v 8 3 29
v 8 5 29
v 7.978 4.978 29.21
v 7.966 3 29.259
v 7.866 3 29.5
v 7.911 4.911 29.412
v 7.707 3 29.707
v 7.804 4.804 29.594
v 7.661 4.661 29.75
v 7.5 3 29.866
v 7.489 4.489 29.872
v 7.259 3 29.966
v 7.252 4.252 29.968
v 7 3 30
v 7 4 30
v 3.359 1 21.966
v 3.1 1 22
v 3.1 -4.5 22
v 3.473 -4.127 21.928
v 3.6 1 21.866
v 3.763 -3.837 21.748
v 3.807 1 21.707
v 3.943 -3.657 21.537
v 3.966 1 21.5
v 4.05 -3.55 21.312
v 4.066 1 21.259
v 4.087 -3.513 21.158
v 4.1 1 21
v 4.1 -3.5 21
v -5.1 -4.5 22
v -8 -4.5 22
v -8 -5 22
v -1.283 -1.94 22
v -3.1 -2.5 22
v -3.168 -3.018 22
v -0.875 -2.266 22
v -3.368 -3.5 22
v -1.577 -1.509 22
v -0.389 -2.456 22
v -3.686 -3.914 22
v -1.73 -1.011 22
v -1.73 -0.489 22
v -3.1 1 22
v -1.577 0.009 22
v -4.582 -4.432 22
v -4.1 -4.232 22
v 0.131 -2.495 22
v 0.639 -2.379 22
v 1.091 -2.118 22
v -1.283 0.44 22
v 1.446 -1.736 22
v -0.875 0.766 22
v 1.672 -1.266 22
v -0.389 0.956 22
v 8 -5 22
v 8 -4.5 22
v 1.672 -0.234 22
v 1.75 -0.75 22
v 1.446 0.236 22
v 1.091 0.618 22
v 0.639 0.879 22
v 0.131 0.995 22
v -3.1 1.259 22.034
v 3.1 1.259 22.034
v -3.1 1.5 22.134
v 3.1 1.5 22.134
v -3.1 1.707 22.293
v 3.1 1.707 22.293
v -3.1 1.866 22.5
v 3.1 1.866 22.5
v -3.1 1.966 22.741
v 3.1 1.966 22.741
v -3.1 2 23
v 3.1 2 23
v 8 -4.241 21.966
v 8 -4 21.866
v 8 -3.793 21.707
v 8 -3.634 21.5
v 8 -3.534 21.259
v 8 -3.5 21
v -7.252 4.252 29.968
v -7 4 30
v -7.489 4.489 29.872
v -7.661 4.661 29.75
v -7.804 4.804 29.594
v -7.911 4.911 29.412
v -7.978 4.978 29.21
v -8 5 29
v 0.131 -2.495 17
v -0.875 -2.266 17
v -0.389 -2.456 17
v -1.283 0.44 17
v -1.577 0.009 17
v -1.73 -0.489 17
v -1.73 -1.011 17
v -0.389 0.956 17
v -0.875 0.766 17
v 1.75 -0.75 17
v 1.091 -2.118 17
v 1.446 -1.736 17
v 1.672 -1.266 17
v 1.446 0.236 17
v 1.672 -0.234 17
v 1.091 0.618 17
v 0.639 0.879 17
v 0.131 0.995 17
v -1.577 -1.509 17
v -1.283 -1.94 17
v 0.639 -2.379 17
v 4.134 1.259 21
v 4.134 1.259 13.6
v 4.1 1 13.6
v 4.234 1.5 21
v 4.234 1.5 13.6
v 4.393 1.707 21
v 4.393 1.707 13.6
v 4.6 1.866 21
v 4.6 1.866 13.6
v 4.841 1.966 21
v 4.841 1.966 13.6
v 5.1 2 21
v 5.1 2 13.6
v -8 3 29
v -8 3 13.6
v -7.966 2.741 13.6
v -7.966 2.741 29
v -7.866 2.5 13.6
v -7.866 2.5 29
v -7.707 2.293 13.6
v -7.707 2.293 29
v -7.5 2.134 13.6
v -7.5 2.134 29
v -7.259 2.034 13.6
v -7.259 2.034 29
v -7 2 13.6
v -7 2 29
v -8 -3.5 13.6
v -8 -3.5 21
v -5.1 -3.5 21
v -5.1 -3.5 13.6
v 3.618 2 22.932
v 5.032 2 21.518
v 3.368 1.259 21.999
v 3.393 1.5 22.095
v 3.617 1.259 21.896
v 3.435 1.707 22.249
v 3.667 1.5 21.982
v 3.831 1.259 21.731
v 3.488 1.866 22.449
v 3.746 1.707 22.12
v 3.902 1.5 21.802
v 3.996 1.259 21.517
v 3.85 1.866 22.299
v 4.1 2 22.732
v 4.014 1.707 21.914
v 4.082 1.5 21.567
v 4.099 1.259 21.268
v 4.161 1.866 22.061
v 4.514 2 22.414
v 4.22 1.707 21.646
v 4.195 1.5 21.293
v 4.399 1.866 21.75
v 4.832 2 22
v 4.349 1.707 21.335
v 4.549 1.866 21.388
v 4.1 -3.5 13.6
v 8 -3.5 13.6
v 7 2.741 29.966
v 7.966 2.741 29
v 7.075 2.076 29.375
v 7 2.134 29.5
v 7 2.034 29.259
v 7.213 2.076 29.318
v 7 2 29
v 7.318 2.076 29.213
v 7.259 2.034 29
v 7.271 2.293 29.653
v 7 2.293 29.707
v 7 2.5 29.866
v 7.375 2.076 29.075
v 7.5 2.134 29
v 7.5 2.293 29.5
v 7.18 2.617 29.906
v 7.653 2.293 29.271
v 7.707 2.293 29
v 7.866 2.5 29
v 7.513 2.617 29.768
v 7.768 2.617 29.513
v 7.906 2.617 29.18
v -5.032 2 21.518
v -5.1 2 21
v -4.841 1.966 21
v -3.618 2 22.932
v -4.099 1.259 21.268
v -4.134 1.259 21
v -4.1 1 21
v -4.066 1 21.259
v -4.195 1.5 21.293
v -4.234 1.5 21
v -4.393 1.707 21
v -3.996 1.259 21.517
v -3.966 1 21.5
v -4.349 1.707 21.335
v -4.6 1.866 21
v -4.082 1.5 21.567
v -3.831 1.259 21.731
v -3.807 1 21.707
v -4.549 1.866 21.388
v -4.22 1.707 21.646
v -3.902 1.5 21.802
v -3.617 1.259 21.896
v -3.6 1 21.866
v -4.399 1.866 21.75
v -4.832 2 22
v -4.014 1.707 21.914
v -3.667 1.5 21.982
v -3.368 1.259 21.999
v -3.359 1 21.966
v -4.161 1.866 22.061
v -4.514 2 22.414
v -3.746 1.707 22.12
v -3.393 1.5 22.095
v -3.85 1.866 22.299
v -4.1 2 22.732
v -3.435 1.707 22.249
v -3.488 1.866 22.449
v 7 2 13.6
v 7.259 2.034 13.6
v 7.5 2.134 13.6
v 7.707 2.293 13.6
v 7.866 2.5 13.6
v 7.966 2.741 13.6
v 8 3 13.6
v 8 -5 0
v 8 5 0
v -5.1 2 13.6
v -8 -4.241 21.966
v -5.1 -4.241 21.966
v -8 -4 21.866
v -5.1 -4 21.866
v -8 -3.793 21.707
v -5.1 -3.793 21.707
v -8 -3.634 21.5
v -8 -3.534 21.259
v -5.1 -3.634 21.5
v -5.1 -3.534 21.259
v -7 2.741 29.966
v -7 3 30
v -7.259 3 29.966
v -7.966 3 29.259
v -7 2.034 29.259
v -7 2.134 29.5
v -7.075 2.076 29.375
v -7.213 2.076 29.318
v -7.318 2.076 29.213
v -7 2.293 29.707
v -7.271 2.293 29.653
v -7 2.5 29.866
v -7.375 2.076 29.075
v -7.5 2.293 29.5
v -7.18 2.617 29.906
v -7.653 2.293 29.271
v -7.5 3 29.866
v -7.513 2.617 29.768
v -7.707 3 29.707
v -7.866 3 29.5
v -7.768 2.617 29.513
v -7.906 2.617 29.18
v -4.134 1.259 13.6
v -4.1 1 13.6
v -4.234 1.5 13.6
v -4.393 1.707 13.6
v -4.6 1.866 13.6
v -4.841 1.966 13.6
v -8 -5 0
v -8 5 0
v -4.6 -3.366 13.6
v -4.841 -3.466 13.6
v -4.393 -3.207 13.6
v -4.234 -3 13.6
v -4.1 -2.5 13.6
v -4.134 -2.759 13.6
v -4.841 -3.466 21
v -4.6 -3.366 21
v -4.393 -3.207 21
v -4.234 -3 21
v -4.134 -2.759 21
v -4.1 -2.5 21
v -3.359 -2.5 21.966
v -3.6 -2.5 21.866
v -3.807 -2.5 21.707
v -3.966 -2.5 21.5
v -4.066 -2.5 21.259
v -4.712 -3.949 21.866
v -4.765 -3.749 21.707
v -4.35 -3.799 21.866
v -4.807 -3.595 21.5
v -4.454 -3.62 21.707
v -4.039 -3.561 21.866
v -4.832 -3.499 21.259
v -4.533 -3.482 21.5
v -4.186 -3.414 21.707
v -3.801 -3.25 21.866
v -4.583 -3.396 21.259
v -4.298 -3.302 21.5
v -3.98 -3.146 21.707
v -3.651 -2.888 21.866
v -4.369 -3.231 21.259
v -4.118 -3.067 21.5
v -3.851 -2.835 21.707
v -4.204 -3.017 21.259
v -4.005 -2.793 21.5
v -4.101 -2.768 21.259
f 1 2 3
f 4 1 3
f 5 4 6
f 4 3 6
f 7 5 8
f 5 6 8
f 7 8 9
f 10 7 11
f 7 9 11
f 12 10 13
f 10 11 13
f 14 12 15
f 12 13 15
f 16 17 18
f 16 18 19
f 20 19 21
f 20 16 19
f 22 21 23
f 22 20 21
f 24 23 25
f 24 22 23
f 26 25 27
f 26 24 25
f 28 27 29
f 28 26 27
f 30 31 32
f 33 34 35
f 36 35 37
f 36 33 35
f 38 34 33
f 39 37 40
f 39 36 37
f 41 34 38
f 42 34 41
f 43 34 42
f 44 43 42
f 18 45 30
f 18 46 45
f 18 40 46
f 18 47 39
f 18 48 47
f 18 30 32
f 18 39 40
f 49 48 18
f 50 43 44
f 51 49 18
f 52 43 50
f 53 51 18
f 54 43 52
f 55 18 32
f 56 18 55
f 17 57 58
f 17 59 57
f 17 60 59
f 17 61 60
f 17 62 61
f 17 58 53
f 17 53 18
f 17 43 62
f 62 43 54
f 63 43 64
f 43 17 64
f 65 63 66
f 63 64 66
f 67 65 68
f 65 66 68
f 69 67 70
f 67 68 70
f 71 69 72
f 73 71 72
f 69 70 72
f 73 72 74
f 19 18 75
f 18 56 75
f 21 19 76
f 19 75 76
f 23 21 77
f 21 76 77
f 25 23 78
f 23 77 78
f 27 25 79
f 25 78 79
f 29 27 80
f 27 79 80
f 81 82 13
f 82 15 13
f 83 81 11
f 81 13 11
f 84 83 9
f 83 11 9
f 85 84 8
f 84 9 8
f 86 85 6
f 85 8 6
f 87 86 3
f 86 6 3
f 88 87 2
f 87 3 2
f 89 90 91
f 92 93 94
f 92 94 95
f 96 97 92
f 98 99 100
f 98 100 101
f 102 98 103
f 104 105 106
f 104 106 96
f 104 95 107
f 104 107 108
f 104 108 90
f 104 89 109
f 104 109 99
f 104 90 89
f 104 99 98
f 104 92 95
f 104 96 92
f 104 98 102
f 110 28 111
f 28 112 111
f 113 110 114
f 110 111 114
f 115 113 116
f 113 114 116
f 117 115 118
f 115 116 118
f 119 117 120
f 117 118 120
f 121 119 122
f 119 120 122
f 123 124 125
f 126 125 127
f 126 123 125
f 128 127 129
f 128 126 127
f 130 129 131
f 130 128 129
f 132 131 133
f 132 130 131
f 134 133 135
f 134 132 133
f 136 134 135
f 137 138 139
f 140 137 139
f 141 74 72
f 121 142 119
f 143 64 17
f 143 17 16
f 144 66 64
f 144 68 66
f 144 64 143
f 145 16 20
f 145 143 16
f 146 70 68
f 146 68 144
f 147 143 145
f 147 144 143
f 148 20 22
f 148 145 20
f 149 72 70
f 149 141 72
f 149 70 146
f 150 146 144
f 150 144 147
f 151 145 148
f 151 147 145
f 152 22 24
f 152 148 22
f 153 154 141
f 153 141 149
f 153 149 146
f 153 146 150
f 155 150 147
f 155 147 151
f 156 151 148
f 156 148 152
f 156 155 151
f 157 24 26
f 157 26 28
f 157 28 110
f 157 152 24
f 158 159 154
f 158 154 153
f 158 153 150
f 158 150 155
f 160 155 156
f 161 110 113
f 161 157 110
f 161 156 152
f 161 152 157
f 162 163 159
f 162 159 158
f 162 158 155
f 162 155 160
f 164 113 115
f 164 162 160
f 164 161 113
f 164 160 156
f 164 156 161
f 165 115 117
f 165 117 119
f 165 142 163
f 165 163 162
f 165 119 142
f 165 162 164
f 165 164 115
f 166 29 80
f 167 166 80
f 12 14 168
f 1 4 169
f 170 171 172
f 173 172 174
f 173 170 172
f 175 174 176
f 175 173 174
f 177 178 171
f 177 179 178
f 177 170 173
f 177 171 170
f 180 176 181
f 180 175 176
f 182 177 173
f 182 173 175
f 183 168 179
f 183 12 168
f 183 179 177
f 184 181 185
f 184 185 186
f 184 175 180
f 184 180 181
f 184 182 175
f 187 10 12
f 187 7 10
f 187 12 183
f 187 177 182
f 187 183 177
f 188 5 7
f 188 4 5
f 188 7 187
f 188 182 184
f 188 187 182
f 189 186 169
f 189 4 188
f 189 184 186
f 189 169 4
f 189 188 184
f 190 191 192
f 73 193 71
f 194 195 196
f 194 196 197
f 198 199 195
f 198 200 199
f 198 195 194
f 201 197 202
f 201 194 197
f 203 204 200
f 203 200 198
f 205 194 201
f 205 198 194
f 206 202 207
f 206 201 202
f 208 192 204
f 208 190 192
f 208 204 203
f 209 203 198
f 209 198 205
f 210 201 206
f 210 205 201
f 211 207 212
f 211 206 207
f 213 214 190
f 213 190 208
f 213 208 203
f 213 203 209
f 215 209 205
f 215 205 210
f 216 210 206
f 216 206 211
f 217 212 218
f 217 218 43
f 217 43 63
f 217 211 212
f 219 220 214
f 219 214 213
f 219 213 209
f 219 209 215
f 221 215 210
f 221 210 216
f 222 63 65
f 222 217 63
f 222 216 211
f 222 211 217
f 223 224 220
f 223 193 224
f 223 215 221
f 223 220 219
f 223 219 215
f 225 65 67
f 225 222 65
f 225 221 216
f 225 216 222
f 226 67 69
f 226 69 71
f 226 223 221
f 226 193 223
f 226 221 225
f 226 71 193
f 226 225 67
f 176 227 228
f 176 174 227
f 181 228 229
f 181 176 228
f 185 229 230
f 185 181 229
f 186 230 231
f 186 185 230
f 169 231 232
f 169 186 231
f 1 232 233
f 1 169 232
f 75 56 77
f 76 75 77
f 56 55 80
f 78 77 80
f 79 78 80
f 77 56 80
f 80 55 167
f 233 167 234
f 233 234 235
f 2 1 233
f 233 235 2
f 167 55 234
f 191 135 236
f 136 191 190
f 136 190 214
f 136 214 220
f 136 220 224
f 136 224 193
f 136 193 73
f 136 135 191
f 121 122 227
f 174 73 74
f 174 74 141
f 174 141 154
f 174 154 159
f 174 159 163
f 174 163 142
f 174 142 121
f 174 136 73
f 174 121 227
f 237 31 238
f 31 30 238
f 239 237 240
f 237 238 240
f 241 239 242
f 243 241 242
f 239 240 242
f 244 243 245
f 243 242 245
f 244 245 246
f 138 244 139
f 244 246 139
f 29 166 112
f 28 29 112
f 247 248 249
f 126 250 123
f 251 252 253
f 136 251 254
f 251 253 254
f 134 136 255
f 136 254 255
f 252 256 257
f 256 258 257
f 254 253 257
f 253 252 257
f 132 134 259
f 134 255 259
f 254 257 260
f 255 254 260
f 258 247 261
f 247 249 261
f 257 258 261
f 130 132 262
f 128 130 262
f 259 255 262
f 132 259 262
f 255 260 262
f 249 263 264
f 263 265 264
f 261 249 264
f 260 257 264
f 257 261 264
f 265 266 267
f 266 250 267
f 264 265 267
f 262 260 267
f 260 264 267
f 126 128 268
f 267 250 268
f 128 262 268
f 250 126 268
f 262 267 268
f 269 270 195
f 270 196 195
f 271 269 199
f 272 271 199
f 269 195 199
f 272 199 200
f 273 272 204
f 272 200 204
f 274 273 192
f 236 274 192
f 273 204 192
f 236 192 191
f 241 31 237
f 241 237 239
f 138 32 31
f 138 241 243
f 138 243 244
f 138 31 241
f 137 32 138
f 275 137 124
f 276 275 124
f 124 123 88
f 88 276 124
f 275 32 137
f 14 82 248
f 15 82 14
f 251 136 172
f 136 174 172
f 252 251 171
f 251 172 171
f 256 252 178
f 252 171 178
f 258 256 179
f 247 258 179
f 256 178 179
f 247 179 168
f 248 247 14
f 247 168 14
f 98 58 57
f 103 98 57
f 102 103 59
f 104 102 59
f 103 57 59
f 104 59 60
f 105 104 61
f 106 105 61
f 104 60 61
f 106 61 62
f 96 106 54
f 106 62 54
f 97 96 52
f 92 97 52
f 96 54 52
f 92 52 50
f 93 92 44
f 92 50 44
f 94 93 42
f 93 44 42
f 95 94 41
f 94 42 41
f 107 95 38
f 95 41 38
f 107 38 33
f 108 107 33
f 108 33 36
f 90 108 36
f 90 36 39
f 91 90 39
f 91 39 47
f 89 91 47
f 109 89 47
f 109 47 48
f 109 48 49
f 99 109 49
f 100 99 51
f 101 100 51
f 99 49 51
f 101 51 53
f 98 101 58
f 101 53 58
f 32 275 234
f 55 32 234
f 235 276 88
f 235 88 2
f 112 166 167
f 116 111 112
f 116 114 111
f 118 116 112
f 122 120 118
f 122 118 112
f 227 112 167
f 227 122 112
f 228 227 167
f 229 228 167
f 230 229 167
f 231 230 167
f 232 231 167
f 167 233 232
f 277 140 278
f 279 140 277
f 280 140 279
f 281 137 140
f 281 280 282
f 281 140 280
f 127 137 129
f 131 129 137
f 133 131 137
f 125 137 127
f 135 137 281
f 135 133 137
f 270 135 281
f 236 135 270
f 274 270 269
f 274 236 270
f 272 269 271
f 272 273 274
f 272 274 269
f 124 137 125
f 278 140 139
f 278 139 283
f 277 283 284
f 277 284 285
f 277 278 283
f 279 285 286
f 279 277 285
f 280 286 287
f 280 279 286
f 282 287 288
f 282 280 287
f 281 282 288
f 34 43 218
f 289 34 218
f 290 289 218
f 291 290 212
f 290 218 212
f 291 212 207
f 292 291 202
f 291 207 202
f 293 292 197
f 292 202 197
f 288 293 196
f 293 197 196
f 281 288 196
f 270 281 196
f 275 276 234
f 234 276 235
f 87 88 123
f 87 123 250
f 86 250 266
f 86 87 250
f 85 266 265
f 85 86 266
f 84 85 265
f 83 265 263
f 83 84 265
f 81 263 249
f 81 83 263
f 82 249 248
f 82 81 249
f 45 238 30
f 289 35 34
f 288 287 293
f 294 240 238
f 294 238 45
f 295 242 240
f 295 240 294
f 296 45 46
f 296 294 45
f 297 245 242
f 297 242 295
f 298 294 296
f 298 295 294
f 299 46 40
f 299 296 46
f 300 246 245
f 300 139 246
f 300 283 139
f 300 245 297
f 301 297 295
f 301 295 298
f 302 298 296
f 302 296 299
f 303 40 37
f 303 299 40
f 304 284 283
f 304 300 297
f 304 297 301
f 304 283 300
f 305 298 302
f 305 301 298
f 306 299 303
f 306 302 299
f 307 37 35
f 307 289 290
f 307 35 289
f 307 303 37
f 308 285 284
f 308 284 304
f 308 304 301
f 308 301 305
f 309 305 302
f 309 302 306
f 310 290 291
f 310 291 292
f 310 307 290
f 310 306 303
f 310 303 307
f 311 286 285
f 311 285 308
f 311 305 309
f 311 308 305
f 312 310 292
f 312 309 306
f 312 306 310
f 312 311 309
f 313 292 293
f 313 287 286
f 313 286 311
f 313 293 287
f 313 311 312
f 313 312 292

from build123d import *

# Parameters (mm, degrees)
F0_W     = 16
F0_H     = 10
F1_DEPTH = 30
F2_W     = 16
F2_H     = 7
F3_DEPTH = 8
F4_W     = 3.9
F4_H     = 5.5
F5_DEPTH = 8.4
F6_R     = 1.75
F7_DEPTH = 5
F8_F1_R  = 1
F8_F2_R  = 1
F8_F3_R  = 0.9999


# Not quite as in the source:
# - a fillet or chamfer is up to 0.001 mm smaller than in the source, because OpenCascade refuses the exact size
# - a feature names something its author has since deleted; it is built from what else it names


with BuildPart() as f1:
    # F0 (on Top) → F1 (new body)
    with BuildSketch(Plane.XY):
        Rectangle(F0_W, F0_H)
    extrude(amount=F1_DEPTH)

    # F2 (on face) → F3 (cut)
    with BuildSketch(Plane.XY.offset(30)):
        with Locations((0, -1.5)):
            Rectangle(F2_W, F2_H)
    extrude(amount=-F3_DEPTH, mode=Mode.SUBTRACT)

    # F4 (on face) → F5 (cut)
    with BuildSketch(Plane.XY.offset(22)):
        with Locations((-6.05, -0.75)):
            Rectangle(F4_W, F4_H)
        with Locations((6.05, -0.75)):
            Rectangle(F4_W, F4_H)
    extrude(amount=-F5_DEPTH, mode=Mode.SUBTRACT)

    # F6 (on face) → F7 (cut)
    with BuildSketch(Plane.XY.offset(22)):
        with Locations((0, -0.75)):
            Circle(F6_R)
    extrude(amount=-F7_DEPTH, mode=Mode.SUBTRACT)

    # F8: fillet of radius 1 on 13 edges, made by hand

    # F8_f1
    f8_f1_edges = [f1.edges().sort_by_distance(p)[0] for p in [
        (-4.1, -3.5, 17.8),
    ]]
    fillet(f8_f1_edges, radius=F8_F1_R)

    # F8_f2
    f8_f2_edges = [f1.edges().sort_by_distance(p)[0] for p in [
        (4.1, -0.75, 22),
        (-4.1, -0.25, 22),
        (6.05, -3.5, 22),
        (8, 3.5, 30),
        (-8, 3.5, 30),
        (0, 2, 30),
        (0, 5, 30),
        (-8, 2, 21.8),
        (8, 2, 21.8),
        (-4.3928932188, -3.2071067812, 22),
    ]]
    fillet(f8_f2_edges, radius=F8_F2_R)

    # F8_f3 (radius 1 in the source; OpenCascade refuses exactly that, so slightly less here)
    f8_f3_edges = [f1.edges().sort_by_distance(p)[0] for p in [
        (4.1, 2, 17.3),
        (-4.1, 2, 17.3),
        (0, 2, 22),
        (3.8071067812, 2, 21.7071067812),
        (-3.8071067812, 2, 21.7071067812),
    ]]
    fillet(f8_f3_edges, radius=F8_F3_R)


solid = f1.part
